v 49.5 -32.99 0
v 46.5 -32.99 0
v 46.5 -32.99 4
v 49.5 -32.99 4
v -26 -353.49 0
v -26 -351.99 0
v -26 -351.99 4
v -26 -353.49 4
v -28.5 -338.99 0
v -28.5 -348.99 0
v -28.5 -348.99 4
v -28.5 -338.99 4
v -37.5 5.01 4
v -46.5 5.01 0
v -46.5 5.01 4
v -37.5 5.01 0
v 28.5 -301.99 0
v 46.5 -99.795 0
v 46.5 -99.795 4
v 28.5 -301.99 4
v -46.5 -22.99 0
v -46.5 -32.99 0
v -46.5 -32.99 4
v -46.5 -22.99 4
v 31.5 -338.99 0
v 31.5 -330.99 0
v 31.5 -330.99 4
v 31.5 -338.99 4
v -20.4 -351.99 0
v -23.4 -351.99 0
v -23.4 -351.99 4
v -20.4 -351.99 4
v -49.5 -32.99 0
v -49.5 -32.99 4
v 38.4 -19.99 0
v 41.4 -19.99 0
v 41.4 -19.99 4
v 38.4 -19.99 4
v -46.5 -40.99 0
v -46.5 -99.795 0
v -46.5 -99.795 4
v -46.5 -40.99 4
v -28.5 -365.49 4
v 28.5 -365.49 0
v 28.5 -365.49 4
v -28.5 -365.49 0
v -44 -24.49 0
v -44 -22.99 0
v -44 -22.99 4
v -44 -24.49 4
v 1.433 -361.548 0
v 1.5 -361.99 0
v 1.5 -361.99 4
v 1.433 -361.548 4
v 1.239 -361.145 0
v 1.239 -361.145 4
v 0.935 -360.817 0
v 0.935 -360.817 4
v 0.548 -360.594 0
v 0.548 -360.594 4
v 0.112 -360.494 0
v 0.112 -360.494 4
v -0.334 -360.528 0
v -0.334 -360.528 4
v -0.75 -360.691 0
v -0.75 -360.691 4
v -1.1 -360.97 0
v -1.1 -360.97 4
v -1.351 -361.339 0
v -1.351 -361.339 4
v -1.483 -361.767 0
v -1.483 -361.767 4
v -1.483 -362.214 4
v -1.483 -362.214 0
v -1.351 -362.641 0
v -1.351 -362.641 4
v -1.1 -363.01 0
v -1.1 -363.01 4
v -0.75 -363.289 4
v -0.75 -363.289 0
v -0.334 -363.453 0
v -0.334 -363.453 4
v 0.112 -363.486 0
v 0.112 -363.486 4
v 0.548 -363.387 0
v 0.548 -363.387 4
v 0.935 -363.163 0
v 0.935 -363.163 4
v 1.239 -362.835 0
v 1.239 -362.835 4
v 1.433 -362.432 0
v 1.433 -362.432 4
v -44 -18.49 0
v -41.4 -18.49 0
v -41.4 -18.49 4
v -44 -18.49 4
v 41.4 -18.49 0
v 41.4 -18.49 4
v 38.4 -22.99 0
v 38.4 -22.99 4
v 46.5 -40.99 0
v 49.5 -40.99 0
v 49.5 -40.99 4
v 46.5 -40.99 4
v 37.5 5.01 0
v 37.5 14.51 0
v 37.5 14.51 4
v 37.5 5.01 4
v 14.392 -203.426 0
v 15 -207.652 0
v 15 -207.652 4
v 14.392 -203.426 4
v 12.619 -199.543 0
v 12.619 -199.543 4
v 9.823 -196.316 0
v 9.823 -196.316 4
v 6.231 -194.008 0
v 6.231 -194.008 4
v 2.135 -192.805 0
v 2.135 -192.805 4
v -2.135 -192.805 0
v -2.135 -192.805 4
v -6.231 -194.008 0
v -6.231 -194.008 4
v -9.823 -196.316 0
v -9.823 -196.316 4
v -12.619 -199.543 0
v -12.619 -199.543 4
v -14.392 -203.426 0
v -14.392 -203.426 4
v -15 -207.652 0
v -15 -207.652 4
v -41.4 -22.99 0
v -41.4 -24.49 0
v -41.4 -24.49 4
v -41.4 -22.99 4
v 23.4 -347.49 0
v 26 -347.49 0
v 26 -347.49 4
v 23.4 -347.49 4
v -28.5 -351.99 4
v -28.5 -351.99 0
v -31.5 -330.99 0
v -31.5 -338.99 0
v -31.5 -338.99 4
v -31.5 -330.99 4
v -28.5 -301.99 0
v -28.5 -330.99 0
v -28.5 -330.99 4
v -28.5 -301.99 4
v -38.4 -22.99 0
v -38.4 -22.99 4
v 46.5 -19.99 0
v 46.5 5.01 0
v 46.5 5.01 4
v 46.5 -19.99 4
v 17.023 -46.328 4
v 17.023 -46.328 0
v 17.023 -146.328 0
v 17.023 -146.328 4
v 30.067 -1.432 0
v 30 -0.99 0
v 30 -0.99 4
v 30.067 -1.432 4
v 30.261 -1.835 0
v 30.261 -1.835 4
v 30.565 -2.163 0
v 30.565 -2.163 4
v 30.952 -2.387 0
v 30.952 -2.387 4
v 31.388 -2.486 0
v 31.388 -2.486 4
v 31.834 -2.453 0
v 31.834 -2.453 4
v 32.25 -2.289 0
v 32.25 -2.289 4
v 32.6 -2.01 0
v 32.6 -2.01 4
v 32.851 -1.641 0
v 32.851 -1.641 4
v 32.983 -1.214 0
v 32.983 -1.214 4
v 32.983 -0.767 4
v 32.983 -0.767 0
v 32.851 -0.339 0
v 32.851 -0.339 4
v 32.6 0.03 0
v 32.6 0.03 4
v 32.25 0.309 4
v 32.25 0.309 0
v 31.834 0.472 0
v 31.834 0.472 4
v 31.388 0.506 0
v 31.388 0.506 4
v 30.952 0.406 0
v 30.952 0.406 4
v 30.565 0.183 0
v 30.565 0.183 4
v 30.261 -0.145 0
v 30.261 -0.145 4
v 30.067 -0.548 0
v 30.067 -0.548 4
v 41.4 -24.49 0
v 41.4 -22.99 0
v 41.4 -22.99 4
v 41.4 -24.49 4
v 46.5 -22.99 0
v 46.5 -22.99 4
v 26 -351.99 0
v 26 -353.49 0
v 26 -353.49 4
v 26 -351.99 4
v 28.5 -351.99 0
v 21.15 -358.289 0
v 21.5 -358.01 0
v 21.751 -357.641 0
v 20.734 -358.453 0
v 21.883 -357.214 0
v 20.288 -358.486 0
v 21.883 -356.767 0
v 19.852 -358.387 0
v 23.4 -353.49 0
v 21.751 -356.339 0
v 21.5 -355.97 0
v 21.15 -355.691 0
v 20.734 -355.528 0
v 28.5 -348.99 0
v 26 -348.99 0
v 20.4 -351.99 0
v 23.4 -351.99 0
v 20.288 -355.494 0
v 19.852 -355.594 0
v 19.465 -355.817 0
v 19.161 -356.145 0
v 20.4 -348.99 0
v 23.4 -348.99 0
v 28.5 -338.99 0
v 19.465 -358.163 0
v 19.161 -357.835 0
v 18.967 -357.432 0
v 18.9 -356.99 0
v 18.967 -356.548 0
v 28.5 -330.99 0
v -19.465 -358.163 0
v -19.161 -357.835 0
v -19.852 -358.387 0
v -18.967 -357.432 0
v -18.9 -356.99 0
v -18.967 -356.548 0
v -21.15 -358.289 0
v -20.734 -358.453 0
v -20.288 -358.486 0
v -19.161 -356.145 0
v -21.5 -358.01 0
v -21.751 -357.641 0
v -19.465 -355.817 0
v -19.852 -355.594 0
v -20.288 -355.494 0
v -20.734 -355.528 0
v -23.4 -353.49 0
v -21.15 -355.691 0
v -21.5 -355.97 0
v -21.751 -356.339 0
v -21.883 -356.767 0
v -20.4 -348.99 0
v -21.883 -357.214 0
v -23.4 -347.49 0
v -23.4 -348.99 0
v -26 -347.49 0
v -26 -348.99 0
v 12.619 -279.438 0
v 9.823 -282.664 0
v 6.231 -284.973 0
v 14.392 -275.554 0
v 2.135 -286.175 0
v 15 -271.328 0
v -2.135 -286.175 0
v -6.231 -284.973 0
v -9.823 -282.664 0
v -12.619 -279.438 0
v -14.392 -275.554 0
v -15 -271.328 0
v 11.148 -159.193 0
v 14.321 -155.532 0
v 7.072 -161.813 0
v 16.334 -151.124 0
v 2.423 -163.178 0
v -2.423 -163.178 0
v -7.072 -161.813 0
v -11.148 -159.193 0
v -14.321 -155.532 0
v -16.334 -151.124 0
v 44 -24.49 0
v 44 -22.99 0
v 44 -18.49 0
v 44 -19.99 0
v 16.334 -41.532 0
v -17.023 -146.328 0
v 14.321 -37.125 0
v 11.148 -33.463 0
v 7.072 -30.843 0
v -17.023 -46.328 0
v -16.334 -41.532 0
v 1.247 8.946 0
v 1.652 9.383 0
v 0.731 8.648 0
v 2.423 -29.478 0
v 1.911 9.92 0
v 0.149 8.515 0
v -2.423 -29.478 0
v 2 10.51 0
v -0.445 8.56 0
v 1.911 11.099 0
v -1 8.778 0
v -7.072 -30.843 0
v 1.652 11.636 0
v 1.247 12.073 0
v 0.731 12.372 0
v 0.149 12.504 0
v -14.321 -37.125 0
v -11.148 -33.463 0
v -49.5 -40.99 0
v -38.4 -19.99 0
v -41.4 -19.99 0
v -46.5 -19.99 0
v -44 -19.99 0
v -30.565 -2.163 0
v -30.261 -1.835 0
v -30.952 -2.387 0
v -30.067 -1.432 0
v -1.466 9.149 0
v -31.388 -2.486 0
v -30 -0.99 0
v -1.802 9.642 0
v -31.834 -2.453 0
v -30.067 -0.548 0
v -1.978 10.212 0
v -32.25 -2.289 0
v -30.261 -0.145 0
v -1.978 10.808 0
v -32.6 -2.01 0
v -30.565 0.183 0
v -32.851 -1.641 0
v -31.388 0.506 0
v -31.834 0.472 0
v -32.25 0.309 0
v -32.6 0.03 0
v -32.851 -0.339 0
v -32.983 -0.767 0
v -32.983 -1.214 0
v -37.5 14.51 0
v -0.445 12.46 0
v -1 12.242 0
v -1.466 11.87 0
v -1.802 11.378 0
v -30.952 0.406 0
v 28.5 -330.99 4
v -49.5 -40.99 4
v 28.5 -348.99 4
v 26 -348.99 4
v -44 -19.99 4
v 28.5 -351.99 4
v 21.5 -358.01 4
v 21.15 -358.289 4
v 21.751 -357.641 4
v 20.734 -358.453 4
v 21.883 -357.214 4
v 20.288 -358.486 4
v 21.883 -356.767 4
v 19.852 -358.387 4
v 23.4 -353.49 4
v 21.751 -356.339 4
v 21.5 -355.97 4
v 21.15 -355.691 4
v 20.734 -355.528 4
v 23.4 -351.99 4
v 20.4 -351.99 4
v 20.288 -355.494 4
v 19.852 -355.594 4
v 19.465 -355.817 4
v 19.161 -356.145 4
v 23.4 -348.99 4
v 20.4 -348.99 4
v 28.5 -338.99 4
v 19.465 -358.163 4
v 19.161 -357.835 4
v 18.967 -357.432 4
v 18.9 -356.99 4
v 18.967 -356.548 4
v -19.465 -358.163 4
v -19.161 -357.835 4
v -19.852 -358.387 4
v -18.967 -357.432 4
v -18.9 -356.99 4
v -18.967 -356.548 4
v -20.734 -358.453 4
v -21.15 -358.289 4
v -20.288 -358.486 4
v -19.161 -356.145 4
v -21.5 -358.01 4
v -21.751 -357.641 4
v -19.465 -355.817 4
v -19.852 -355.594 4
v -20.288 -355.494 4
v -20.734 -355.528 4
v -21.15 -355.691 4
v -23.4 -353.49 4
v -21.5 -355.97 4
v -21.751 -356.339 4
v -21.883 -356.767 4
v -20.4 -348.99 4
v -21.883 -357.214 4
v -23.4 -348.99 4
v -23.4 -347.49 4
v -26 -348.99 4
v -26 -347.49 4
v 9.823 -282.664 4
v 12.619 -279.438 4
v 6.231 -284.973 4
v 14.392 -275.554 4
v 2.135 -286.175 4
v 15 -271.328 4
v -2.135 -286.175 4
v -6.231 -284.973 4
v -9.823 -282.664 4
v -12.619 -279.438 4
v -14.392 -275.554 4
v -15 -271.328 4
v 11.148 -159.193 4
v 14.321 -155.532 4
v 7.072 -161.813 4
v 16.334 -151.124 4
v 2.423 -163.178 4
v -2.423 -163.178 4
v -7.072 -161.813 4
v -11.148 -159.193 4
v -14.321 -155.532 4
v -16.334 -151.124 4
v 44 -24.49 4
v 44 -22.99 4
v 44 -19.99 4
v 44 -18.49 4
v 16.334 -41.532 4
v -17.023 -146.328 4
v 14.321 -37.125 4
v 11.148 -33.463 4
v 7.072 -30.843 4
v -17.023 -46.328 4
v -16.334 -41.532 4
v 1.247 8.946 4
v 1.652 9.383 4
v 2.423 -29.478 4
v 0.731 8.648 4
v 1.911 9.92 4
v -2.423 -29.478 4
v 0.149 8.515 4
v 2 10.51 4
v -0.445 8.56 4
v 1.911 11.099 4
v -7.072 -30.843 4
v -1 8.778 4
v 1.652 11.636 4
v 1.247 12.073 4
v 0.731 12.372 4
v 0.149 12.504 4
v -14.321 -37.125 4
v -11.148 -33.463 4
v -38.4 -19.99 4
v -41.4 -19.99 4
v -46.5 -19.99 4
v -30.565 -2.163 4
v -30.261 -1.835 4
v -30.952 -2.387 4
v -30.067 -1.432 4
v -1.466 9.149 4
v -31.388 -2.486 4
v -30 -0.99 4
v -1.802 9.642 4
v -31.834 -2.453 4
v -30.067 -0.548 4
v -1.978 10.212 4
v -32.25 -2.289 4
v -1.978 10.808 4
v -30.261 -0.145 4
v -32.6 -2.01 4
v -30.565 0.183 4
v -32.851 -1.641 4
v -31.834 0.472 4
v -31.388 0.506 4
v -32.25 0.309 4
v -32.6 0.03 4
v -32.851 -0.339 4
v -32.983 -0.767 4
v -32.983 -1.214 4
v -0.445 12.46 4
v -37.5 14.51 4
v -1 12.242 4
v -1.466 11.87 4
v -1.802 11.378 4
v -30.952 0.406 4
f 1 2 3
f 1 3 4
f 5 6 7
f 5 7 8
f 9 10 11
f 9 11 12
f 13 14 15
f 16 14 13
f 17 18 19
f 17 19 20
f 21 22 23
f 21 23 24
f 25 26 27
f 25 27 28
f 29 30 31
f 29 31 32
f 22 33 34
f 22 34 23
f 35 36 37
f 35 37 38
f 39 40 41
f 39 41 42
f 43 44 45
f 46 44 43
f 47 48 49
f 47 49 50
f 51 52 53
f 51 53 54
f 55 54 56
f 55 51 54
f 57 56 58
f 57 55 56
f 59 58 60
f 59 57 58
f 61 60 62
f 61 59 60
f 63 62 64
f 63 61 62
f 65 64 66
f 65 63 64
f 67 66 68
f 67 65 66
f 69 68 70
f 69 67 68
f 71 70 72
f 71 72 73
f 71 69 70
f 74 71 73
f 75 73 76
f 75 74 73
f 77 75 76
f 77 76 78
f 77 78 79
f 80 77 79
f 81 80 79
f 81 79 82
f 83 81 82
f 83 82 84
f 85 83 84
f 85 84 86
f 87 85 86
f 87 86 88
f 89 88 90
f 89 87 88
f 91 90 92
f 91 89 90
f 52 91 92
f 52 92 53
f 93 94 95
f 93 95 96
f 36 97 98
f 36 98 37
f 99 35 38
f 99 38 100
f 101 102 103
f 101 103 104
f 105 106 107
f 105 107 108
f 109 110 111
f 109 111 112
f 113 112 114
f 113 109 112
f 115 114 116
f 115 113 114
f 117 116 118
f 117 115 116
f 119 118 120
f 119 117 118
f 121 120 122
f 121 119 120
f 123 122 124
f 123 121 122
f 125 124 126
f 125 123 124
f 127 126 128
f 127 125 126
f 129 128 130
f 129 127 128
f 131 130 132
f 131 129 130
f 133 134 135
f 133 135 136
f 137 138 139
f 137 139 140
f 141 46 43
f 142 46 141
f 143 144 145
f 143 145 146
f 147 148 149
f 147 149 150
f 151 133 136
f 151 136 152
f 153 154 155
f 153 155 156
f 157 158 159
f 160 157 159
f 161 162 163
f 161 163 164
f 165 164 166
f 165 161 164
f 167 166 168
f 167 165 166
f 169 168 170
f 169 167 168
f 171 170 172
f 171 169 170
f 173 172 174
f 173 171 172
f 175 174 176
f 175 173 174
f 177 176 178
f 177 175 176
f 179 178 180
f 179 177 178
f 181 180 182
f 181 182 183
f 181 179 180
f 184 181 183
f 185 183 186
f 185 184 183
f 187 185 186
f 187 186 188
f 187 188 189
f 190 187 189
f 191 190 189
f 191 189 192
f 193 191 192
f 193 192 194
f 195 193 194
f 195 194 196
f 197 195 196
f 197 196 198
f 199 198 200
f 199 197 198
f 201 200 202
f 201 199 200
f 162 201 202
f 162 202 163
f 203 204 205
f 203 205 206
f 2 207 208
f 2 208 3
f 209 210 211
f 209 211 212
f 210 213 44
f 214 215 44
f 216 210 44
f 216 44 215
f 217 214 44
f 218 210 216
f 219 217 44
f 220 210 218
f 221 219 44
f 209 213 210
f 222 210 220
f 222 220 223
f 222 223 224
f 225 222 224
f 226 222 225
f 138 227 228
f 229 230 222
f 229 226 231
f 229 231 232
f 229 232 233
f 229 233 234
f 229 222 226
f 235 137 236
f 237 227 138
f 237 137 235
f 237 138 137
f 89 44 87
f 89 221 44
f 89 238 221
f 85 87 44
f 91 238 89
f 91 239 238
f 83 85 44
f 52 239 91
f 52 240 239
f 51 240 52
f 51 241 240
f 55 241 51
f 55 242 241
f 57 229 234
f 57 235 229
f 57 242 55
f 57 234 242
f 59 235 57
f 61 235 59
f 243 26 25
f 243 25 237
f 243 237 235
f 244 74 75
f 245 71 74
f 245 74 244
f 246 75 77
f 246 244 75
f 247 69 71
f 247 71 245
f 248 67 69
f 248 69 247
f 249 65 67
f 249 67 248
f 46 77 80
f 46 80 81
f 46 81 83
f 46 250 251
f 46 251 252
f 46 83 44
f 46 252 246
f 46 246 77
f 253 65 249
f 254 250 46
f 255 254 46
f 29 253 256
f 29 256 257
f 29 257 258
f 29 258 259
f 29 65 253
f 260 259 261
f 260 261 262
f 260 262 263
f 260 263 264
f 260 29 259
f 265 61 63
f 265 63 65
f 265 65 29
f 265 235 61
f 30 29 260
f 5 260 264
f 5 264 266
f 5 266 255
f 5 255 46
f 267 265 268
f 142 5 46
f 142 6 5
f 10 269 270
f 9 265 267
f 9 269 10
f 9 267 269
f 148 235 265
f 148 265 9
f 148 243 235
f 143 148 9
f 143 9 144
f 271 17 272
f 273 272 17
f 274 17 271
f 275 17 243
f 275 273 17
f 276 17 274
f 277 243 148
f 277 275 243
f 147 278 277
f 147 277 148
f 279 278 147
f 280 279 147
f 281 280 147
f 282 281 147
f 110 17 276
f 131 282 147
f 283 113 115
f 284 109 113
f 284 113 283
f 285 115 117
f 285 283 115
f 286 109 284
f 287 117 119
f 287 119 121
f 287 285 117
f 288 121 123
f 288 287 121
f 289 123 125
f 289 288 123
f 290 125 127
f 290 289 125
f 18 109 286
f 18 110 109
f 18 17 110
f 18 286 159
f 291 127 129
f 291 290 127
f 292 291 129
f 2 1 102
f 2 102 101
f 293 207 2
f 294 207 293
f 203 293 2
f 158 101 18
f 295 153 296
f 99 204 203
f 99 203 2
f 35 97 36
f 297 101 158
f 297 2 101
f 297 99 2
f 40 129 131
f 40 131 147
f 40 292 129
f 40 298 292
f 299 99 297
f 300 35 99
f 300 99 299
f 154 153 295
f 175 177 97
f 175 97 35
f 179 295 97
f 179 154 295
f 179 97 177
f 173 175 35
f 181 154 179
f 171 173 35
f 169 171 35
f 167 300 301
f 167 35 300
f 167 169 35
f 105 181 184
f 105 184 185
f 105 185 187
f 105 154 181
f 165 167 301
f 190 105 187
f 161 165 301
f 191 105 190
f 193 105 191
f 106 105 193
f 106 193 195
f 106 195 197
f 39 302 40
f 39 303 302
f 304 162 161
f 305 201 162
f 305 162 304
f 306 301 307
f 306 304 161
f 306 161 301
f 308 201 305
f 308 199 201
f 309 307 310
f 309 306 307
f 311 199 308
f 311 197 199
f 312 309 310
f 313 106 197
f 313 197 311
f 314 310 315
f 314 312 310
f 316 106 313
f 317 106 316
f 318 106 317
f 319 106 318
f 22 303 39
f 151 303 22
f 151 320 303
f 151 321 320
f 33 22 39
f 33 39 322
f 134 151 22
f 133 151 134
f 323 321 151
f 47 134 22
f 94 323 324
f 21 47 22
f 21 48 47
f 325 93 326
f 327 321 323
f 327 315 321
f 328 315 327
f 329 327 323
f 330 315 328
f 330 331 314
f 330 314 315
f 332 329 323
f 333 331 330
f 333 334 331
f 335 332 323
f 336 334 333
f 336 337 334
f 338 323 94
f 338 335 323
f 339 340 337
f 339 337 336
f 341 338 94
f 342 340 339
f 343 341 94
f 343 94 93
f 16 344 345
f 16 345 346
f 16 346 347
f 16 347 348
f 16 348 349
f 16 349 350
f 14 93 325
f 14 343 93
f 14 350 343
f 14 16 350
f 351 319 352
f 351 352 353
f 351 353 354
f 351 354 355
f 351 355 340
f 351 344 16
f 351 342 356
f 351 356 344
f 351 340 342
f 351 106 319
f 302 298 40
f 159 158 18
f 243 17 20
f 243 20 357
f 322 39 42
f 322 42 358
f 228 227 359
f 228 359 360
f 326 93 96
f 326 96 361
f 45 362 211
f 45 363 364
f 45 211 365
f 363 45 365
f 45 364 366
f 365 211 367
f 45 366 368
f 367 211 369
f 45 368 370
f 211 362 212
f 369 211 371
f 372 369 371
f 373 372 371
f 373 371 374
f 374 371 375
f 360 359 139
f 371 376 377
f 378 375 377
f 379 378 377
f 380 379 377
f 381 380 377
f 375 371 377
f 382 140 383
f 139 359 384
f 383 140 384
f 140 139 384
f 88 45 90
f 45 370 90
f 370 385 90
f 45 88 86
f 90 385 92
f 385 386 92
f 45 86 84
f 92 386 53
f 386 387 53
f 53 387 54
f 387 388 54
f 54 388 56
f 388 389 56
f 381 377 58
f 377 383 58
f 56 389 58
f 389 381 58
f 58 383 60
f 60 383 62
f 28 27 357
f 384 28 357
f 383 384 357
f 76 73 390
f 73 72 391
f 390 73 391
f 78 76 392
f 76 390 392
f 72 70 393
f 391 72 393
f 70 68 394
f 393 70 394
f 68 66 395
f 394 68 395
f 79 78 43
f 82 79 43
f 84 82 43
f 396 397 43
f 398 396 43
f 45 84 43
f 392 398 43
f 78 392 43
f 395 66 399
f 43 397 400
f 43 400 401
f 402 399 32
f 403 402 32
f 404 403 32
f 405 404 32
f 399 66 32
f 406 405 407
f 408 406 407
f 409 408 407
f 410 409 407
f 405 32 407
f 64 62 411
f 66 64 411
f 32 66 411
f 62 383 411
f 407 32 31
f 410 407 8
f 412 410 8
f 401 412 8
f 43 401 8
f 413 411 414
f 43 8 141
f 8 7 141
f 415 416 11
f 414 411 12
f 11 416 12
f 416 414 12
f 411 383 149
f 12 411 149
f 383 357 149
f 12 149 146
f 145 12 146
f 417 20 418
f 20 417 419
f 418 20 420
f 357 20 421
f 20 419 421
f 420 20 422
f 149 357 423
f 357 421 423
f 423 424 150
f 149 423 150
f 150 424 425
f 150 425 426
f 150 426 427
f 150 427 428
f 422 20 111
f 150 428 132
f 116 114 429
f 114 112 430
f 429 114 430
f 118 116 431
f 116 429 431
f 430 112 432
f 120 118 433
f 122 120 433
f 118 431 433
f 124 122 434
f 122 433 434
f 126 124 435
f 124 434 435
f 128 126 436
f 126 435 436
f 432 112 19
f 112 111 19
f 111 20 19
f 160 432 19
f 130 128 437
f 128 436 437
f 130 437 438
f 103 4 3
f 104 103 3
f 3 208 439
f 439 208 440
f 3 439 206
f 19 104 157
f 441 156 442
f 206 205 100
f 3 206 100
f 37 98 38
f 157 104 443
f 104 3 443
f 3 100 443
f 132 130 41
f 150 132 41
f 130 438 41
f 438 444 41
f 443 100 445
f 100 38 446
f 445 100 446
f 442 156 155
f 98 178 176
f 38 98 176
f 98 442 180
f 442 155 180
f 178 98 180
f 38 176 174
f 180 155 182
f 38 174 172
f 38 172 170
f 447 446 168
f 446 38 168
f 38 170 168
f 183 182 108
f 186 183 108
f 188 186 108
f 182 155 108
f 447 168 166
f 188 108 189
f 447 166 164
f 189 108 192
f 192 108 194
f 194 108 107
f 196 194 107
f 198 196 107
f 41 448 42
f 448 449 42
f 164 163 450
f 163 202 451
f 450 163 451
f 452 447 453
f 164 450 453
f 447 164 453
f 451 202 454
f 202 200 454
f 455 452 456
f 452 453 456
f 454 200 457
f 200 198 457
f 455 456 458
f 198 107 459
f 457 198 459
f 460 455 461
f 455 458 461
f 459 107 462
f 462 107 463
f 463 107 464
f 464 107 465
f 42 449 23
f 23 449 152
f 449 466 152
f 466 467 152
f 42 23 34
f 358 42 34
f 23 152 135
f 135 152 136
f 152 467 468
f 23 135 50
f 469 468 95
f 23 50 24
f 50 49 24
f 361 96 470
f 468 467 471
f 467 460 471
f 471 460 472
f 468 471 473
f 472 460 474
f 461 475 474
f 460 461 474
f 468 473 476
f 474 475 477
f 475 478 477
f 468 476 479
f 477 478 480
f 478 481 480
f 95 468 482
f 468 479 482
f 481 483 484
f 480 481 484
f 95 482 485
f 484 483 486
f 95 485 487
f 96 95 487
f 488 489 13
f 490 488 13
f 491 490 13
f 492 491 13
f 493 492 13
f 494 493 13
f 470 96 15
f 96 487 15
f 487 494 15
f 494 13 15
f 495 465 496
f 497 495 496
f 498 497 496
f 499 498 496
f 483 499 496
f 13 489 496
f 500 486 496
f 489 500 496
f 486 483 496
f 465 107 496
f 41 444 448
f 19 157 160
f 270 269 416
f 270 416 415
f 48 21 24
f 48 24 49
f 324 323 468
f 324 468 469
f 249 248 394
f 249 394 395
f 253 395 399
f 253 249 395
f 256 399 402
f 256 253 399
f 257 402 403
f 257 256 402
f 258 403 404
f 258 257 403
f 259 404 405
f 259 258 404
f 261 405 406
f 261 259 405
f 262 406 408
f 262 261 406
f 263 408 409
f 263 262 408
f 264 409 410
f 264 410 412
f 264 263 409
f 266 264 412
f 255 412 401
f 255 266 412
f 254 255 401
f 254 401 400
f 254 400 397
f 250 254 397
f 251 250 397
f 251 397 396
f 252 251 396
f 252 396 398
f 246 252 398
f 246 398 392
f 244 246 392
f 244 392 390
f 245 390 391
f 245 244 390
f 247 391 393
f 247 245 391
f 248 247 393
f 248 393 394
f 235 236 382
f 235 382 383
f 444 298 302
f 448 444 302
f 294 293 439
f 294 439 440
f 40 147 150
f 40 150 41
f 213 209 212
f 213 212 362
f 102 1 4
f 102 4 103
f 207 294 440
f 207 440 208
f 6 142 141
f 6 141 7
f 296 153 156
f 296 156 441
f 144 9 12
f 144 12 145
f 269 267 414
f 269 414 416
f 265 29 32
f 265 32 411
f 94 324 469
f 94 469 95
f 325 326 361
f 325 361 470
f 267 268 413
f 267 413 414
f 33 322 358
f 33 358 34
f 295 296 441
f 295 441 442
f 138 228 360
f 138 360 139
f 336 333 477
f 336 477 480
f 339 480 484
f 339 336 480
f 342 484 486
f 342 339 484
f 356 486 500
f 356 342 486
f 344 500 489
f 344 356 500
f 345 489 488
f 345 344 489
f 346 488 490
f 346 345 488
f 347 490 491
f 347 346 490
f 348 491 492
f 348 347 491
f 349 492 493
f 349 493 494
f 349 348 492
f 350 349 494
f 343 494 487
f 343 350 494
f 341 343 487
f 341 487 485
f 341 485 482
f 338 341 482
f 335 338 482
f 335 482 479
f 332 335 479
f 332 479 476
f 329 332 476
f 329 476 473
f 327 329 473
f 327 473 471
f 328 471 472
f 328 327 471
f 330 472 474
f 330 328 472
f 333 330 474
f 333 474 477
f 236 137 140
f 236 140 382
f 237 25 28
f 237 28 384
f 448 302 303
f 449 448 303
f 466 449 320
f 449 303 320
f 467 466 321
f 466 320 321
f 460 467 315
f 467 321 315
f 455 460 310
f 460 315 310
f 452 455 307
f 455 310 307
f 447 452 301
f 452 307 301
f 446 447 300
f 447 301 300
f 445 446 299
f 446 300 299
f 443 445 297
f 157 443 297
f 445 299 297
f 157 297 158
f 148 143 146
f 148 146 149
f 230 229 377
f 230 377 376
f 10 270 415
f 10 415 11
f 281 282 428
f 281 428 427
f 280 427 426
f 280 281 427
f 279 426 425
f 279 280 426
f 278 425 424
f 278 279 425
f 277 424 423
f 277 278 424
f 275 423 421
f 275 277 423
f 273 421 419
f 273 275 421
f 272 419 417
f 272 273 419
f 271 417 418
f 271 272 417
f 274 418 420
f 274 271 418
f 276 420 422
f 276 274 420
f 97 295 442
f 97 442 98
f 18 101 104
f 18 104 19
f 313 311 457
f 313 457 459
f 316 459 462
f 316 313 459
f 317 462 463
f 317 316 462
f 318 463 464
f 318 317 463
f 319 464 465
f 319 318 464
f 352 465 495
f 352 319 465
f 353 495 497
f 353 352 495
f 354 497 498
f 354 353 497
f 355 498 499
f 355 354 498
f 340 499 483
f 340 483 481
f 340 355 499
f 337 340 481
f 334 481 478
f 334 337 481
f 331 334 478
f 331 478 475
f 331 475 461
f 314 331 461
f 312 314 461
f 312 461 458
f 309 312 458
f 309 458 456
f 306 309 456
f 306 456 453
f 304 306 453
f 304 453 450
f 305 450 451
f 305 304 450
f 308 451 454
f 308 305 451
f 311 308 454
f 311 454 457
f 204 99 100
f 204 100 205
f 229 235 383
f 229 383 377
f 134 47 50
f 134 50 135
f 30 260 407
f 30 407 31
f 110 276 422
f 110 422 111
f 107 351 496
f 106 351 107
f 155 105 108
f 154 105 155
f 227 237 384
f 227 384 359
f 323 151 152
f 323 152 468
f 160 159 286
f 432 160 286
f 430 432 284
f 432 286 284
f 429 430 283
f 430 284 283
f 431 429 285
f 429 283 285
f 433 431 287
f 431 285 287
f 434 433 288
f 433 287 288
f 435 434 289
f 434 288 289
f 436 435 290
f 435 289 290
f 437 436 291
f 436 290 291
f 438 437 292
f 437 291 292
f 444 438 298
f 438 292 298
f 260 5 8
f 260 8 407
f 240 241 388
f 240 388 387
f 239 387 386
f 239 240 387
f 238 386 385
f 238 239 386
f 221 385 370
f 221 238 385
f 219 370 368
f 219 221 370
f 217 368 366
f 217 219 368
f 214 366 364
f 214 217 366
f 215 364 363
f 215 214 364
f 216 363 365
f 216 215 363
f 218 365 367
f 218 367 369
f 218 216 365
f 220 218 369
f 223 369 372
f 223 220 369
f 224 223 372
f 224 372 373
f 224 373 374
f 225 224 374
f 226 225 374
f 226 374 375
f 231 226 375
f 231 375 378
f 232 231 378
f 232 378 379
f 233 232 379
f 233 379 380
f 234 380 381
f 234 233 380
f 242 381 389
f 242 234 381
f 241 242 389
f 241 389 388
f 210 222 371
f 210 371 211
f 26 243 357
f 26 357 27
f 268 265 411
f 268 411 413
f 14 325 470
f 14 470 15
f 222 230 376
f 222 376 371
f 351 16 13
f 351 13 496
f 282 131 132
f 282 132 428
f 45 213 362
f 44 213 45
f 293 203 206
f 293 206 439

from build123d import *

# Parameters (mm, degrees)
SKETCH_3_R      = 1.5
SKETCH_3_R_2    = 2
EXTRUDE_1_DEPTH = 4


with BuildPart() as part:
    # 草图3 → 凸台-拉伸1 (new body)
    with BuildSketch(Plane.XY):
        Polygon((-46.5, 5.009783315), (-37.5, 5.009783315), (-37.5, 14.509783315), (37.5, 14.509783315), (37.5, 5.009783315), (46.5, 5.009783315), (46.5, -19.990216685), (44, -19.990216685), (44, -18.490216685), (41.4, -18.490216685), (41.4, -19.990216685), (38.4, -19.990216685), (38.4, -22.990216685), (41.4, -22.990216685), (41.4, -24.490216685), (44, -24.490216685), (44, -22.990216685), (46.5, -22.990216685), (46.5, -32.990216685), (49.5, -32.990216685), (49.5, -40.990216685), (46.5, -40.990216685), (46.5, -99.795048798), (28.5, -301.990216685), (28.5, -330.990216685), (31.5, -330.990216685), (31.5, -338.990216685), (28.5, -338.990216685), (28.5, -348.990216685), (26, -348.990216685), (26, -347.490216685), (23.4, -347.490216685), (23.4, -348.990216685), (20.4, -348.990216685), (20.4, -351.990216685), (23.4, -351.990216685), (23.4, -353.490216685), (26, -353.490216685), (26, -351.990216685), (28.5, -351.990216685), (28.5, -365.490216685), (-28.5, -365.490216685), (-28.5, -351.990216685), (-26, -351.990216685), (-26, -353.490216685), (-23.4, -353.490216685), (-23.4, -351.990216685), (-20.4, -351.990216685), (-20.4, -348.990216685), (-23.4, -348.990216685), (-23.4, -347.490216685), (-26, -347.490216685), (-26, -348.990216685), (-28.5, -348.990216685), (-28.5, -338.990216685), (-31.5, -338.990216685), (-31.5, -330.990216685), (-28.5, -330.990216685), (-28.5, -301.990216685), (-46.5, -99.795048798), (-46.5, -40.990216685), (-49.5, -40.990216685), (-49.5, -32.990216685), (-46.5, -32.990216685), (-46.5, -22.990216685), (-44, -22.990216685), (-44, -24.490216685), (-41.4, -24.490216685), (-41.4, -22.990216685), (-38.4, -22.990216685), (-38.4, -19.990216685), (-41.4, -19.990216685), (-41.4, -18.490216685), (-44, -18.490216685), (-44, -19.990216685), (-46.5, -19.990216685), align=None)
        with Locations((-31.5, -0.990216685)):
            Circle(SKETCH_3_R, mode=Mode.SUBTRACT)
        with Locations((0, 10.509783315)):
            Circle(SKETCH_3_R_2, mode=Mode.SUBTRACT)
        with Locations(Location((31.5, -0.990216685, 0), (0, 0, 180))):
            Circle(SKETCH_3_R, mode=Mode.SUBTRACT)
        with Locations((0, -361.990216685)):
            Circle(SKETCH_3_R, mode=Mode.SUBTRACT)
        with Locations((-20.4, -356.990216685)):
            Circle(SKETCH_3_R, mode=Mode.SUBTRACT)
        with Locations(Location((20.4, -356.990216685, 0), (0, 0, 180))):
            Circle(SKETCH_3_R, mode=Mode.SUBTRACT)
        with BuildLine():
            Line((-17.023193691, -146.328074808), (-17.023193691, -46.328074808))
            ThreePointArc((-17.023193691, -46.328074808), (0, -29.304881117), (17.023193691, -46.328074808))
            Line((17.023193691, -46.328074808), (17.023193691, -146.328074808))
            ThreePointArc((17.023193691, -146.328074808), (0, -163.351268499), (-17.023193691, -146.328074808))
        make_face(mode=Mode.SUBTRACT)
        with BuildLine():
            Line((-15, -207.652358563), (-15, -271.328074808))
            ThreePointArc((-15, -271.328074808), (0, -286.328074808), (15, -271.328074808))
            Line((15, -271.328074808), (15, -207.652358563))
            ThreePointArc((15, -207.652358563), (0, -192.652358563), (-15, -207.652358563))
        make_face(mode=Mode.SUBTRACT)
    extrude(amount=EXTRUDE_1_DEPTH)


solid = part.part
